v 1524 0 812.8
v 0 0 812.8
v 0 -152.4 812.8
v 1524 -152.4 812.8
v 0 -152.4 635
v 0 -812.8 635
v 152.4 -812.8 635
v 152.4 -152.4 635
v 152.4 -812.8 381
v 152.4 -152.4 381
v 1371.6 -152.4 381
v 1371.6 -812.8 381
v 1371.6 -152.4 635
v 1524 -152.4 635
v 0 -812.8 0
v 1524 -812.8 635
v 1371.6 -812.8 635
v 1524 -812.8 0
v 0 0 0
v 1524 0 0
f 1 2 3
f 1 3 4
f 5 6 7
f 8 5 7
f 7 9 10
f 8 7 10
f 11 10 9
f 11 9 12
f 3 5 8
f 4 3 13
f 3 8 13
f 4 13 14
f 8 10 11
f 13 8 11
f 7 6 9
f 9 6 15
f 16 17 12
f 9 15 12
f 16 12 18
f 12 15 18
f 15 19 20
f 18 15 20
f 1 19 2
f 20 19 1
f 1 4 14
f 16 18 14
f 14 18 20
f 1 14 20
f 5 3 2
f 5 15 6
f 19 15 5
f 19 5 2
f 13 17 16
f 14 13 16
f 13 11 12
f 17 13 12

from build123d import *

# Parameters (mm, degrees)
F0_W     = 1524
F0_H     = 812.8
F1_DEPTH = 381
F3_DEPTH = 254
F4_W     = 1524
F4_H     = 152.4
F5_DEPTH = 177.8


with BuildPart() as f1:
    # F0 (on Top) → F1 (new body)
    with BuildSketch(Plane.XY):
        with Locations((762, -406.4)):
            Rectangle(F0_W, F0_H)
    extrude(amount=F1_DEPTH)

    # F2 (on face) → F3 (join)
    with BuildSketch(Plane.XY.offset(381)):
        Polygon((0, 0), (0, -812.8), (152.4, -812.8), (152.4, -152.4), (1371.6, -152.4), (1371.6, -812.8), (1524, -812.8), (1524, 0), align=None)
    extrude(amount=F3_DEPTH)

    # F4 (on face) → F5 (join)
    with BuildSketch(Plane.XY.offset(635)):
        with Locations((762, -76.2)):
            Rectangle(F4_W, F4_H)
    extrude(amount=F5_DEPTH)


solid = f1.part
